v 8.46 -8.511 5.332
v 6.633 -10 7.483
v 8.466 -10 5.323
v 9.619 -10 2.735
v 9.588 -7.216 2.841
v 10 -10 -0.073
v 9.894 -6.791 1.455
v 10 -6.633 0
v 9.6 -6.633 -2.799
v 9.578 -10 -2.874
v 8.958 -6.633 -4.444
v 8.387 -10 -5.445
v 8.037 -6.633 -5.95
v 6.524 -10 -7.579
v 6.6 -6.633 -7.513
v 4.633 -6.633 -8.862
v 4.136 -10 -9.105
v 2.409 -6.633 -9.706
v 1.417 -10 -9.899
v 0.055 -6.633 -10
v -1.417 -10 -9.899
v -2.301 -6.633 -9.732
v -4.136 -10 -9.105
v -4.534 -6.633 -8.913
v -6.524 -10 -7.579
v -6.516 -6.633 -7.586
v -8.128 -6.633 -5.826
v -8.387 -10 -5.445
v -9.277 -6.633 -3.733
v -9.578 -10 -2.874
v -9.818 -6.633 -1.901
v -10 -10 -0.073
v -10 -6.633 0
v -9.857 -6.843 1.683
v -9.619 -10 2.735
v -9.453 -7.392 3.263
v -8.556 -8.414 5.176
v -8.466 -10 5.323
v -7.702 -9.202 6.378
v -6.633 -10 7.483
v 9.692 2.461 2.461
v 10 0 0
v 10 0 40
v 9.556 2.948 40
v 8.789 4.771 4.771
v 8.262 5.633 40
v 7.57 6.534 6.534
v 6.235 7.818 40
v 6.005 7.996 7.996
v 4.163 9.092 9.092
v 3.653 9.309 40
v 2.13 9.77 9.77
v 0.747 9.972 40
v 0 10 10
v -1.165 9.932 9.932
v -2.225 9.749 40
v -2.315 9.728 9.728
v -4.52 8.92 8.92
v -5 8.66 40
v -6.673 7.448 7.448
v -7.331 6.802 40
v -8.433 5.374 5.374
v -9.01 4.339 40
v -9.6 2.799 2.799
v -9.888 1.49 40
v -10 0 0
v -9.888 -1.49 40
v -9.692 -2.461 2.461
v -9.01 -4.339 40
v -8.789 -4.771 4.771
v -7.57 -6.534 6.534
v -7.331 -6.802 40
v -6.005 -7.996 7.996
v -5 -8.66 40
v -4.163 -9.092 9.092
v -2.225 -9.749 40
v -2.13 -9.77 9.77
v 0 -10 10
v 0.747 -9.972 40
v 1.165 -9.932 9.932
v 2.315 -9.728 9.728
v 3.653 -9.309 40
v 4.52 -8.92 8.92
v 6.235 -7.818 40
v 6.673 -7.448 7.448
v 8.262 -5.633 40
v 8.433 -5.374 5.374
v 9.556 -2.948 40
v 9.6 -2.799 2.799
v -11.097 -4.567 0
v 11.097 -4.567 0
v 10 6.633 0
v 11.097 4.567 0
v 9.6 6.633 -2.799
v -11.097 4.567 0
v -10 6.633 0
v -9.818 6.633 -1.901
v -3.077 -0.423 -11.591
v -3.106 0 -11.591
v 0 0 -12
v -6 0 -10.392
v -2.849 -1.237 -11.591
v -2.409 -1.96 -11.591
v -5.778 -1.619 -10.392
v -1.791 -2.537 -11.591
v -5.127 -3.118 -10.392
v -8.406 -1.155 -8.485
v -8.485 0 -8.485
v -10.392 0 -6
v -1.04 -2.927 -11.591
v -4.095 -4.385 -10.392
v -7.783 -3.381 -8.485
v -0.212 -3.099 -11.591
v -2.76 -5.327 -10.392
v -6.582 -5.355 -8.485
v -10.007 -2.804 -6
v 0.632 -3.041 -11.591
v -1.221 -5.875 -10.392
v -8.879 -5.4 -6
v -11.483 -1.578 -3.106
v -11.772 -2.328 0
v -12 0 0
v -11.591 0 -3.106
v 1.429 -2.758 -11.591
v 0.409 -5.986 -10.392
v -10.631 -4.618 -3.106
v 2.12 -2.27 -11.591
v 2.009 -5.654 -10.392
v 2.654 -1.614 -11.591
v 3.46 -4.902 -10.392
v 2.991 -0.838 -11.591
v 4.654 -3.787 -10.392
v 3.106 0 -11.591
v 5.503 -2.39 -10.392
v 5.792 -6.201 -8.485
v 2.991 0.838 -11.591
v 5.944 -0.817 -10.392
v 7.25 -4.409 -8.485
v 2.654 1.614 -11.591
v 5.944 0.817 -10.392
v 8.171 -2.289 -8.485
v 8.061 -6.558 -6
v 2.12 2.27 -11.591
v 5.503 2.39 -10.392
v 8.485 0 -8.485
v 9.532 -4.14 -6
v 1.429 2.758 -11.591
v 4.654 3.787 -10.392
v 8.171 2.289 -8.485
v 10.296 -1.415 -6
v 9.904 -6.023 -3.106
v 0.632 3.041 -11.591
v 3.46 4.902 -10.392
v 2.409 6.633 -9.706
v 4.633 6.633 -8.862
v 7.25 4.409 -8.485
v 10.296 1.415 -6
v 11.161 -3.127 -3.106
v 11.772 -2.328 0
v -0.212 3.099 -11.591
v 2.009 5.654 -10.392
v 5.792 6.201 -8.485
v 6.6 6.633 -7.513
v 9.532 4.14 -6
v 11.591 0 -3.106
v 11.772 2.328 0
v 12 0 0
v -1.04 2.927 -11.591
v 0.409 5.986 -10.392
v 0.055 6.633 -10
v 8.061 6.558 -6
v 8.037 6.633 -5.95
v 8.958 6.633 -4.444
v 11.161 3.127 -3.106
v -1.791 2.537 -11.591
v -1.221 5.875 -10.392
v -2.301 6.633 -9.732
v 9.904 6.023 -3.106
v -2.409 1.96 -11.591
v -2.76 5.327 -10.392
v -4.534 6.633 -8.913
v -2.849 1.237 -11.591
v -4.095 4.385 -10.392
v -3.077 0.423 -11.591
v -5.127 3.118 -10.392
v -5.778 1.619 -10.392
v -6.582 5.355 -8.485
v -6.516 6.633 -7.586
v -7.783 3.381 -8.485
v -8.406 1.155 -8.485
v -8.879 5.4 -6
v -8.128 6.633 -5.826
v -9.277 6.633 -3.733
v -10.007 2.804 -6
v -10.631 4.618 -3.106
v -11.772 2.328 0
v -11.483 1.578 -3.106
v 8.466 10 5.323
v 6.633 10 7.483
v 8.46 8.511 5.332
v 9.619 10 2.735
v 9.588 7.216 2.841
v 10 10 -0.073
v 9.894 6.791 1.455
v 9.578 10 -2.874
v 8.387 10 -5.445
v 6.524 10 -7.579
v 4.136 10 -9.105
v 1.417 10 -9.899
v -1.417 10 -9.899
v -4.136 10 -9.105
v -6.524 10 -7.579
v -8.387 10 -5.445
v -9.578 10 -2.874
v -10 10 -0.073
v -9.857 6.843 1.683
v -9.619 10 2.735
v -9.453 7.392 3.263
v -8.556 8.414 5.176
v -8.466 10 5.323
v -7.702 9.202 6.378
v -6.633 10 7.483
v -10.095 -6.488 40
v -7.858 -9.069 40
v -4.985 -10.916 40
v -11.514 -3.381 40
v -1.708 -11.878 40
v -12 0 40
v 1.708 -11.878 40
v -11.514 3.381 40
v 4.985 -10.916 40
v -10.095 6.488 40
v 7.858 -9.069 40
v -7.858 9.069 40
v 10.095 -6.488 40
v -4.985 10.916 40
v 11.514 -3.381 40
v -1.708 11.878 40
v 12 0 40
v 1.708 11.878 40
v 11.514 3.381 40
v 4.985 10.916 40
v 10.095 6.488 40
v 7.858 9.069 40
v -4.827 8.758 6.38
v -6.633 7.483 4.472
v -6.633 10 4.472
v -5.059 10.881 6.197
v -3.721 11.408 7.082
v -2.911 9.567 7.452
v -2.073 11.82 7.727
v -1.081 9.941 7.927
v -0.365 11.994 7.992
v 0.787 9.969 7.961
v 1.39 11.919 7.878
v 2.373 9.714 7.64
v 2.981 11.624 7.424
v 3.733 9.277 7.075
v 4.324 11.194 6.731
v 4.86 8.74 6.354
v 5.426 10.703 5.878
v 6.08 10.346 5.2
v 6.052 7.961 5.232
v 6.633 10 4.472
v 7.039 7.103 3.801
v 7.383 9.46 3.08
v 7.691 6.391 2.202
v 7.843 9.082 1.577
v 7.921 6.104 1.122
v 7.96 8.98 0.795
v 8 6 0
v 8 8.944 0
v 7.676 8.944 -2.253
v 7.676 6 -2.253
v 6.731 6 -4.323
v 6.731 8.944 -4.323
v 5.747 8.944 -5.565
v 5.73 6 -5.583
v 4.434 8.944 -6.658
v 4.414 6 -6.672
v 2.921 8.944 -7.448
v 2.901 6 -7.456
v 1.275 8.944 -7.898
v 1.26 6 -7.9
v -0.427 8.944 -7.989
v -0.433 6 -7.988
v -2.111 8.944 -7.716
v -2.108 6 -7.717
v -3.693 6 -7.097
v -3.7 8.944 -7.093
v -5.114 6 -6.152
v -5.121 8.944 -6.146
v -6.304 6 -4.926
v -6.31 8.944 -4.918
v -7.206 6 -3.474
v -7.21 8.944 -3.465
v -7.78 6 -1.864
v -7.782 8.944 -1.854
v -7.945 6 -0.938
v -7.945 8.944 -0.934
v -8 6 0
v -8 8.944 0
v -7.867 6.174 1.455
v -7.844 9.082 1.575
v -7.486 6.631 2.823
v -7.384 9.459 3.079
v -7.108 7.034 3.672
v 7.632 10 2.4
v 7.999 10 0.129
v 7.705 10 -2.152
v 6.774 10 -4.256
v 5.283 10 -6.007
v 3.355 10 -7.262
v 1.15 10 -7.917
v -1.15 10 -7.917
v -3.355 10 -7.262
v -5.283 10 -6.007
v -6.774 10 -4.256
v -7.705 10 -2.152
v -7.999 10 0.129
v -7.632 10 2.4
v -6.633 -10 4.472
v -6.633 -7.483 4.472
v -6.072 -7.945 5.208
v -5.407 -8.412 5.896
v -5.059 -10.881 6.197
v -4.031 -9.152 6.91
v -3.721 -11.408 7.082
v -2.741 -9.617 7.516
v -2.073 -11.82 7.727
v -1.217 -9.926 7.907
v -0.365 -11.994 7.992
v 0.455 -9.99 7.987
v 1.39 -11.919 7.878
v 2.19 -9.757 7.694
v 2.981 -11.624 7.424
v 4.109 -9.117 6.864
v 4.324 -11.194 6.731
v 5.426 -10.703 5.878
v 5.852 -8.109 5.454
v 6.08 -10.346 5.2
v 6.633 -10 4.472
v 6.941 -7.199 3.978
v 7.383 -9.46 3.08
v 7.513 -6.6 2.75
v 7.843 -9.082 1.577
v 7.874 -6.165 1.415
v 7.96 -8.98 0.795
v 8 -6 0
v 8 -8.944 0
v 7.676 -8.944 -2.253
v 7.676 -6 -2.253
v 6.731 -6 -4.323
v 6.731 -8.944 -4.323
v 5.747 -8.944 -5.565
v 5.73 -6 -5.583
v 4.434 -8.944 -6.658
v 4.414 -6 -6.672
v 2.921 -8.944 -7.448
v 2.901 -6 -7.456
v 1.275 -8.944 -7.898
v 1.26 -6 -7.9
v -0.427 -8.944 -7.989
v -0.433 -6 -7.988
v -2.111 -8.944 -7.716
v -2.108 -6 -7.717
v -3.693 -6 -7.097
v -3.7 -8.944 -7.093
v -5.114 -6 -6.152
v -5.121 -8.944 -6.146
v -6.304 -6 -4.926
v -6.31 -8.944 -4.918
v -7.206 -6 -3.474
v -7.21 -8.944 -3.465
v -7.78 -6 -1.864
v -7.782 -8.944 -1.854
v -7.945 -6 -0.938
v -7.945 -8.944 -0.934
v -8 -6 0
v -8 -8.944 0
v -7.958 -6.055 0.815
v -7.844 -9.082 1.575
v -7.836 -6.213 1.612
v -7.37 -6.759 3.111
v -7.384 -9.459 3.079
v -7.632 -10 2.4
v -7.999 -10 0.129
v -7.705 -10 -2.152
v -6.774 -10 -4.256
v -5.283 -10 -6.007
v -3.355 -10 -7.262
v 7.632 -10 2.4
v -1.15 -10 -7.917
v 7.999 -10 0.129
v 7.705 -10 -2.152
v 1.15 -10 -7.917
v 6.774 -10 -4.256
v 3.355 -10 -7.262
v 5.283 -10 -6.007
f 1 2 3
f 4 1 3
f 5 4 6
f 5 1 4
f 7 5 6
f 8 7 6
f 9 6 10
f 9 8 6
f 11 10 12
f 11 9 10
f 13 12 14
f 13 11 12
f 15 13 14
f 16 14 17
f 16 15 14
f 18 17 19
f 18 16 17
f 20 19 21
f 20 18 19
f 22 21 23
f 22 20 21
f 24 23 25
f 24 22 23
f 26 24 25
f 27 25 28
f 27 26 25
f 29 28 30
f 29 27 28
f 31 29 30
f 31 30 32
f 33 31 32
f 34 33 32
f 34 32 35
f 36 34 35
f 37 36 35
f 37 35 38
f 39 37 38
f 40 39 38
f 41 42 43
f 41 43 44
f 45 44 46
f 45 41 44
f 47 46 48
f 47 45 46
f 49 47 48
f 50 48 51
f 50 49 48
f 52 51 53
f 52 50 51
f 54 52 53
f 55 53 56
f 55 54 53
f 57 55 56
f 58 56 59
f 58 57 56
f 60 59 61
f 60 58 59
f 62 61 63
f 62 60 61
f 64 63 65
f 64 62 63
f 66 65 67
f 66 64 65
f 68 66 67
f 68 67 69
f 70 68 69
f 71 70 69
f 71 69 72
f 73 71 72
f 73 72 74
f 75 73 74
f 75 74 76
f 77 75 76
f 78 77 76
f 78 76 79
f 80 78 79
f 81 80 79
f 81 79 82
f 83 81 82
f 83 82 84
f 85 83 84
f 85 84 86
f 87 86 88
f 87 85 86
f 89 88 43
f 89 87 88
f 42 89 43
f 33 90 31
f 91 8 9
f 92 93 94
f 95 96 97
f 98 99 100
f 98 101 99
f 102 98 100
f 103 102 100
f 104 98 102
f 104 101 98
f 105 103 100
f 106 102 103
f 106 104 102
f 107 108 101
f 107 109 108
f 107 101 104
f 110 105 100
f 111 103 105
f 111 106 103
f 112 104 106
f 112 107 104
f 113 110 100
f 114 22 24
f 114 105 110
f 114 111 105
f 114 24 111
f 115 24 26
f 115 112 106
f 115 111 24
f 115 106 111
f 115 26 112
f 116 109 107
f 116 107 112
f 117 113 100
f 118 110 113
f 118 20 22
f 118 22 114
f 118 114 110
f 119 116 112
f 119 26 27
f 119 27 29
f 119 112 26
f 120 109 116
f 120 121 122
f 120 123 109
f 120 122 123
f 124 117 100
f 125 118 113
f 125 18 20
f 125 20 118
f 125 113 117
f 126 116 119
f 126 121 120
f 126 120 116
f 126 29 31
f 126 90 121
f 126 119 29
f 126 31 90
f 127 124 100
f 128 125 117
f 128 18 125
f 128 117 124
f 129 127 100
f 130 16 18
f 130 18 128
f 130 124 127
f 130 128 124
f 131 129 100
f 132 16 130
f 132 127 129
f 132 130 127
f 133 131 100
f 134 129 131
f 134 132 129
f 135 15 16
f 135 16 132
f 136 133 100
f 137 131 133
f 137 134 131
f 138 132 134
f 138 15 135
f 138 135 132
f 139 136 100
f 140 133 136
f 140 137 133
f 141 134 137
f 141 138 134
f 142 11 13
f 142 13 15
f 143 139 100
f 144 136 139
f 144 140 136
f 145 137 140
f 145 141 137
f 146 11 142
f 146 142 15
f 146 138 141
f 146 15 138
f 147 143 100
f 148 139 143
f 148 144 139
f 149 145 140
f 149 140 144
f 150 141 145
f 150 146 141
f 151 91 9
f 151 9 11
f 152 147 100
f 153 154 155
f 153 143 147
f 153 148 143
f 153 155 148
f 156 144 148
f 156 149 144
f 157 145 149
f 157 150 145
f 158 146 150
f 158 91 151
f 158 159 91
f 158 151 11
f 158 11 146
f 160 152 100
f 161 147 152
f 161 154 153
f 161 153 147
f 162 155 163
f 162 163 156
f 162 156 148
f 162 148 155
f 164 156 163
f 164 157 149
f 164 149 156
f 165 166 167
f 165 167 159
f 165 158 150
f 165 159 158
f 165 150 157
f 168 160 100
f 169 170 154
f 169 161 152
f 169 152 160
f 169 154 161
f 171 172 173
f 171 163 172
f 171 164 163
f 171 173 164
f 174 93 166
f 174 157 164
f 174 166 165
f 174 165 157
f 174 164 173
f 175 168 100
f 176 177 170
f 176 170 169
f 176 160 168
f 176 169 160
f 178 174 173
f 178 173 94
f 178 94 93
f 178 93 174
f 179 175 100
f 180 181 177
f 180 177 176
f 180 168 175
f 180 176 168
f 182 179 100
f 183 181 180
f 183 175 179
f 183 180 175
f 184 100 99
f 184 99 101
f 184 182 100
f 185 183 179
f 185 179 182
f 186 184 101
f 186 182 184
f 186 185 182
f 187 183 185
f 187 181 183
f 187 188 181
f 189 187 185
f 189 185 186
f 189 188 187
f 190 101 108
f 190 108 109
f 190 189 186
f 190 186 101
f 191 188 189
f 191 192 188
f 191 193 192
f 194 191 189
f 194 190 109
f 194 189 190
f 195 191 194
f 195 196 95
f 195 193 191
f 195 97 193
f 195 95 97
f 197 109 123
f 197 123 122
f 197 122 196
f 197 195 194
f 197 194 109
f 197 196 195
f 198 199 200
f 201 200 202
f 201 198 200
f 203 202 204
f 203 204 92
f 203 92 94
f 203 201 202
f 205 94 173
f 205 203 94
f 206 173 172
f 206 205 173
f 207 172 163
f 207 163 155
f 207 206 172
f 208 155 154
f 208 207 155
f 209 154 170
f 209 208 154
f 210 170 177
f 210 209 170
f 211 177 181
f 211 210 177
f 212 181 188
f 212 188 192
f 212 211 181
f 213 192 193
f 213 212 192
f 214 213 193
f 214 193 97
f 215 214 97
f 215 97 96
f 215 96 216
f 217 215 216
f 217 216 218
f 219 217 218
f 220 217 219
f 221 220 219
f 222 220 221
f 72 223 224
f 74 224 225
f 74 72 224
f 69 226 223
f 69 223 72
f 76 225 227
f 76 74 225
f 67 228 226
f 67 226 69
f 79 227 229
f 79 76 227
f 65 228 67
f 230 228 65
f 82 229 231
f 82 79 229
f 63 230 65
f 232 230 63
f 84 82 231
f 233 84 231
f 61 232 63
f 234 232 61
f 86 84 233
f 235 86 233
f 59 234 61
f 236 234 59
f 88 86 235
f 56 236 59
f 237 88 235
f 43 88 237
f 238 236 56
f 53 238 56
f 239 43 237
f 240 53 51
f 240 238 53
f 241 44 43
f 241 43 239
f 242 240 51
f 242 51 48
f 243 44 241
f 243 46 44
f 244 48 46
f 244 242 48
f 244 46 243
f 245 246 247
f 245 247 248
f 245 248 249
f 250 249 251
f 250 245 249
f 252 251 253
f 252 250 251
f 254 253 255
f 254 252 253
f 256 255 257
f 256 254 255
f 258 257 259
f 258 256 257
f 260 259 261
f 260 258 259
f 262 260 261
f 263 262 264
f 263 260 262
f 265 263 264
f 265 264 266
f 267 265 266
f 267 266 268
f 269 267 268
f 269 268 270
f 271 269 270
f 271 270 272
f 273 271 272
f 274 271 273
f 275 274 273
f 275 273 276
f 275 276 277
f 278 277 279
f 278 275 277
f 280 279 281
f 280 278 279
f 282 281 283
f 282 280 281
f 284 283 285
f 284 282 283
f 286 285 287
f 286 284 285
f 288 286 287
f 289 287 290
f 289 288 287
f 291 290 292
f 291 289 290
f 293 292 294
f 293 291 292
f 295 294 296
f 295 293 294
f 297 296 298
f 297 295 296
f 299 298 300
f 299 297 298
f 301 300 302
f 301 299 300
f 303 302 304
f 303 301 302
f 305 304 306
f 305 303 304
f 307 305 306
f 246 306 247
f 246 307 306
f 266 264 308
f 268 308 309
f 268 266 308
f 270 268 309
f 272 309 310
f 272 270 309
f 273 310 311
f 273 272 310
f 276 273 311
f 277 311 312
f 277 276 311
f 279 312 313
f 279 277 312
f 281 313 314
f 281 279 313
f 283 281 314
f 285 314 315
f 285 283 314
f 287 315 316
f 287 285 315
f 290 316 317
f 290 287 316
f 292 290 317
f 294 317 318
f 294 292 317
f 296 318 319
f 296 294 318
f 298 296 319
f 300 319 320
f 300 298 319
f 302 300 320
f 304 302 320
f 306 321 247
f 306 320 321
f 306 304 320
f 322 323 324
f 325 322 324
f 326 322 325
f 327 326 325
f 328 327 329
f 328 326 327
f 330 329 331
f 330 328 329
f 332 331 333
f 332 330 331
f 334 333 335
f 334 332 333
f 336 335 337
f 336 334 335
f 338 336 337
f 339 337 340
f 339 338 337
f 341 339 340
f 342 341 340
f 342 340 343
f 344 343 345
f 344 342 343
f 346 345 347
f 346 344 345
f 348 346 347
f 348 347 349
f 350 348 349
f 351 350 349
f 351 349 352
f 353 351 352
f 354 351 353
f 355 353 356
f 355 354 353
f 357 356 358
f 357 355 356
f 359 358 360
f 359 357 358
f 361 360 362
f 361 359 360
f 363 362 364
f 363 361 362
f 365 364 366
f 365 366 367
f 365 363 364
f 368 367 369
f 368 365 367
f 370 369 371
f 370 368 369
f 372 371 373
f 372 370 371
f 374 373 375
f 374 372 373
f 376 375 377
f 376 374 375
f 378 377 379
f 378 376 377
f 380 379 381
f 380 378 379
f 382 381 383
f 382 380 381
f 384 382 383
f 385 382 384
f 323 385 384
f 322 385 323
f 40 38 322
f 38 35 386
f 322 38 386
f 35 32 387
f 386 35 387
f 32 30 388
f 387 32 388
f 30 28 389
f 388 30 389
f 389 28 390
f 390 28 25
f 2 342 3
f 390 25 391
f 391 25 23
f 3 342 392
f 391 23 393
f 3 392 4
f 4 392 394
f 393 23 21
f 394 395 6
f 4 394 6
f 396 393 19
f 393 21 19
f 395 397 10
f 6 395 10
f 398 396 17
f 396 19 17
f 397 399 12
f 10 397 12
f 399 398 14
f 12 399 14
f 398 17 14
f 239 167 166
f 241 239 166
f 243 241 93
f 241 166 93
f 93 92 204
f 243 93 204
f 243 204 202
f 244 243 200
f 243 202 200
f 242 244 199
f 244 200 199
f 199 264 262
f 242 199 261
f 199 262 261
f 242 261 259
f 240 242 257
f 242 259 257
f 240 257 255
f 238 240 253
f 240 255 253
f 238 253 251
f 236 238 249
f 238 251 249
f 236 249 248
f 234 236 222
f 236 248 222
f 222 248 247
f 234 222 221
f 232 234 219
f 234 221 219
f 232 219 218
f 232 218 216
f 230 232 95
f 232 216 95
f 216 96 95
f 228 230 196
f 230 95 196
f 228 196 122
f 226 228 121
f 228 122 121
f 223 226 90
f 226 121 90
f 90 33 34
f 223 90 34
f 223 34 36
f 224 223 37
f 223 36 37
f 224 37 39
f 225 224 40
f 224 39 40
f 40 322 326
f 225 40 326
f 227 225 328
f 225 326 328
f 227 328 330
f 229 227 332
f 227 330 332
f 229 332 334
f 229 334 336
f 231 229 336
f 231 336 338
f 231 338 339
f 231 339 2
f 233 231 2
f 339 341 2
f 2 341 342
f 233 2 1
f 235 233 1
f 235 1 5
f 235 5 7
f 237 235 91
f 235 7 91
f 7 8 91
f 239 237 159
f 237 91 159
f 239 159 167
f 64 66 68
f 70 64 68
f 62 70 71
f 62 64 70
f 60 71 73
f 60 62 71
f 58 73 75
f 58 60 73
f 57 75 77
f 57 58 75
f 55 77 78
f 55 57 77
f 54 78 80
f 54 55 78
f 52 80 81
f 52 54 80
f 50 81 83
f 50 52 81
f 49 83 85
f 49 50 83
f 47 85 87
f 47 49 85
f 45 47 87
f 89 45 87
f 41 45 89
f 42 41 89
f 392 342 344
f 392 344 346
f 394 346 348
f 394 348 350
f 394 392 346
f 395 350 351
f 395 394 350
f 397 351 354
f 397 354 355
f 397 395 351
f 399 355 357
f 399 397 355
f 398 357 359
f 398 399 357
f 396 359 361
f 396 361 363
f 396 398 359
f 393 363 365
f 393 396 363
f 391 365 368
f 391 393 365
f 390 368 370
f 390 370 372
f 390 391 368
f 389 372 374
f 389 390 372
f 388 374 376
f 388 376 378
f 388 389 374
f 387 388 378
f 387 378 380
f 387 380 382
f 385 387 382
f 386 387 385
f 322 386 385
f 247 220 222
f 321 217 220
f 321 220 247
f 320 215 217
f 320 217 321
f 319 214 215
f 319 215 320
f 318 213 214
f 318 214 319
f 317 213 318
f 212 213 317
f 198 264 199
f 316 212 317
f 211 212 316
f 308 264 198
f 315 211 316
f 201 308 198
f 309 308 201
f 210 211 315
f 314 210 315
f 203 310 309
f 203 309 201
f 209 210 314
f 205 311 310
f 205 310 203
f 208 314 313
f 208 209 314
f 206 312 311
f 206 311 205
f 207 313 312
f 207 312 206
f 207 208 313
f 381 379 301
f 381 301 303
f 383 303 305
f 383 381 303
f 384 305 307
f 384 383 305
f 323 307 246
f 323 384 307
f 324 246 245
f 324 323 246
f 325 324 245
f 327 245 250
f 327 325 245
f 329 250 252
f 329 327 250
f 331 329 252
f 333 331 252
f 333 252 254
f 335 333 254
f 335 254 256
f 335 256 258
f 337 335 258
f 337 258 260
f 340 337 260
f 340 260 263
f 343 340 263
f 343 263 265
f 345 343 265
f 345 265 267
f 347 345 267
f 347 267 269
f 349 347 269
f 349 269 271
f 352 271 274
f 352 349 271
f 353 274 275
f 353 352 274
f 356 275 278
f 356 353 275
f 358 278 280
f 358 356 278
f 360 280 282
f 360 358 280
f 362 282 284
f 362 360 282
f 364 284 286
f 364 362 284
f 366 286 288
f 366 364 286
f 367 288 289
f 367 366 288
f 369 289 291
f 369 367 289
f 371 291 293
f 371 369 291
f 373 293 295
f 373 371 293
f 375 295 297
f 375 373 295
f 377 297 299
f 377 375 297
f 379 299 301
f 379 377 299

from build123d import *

# Parameters (mm, degrees)
SKETCH_1_R               = 12
SKETCH_1_R_2             = 10
EXTRUDE_1_DEPTH          = 40
SKETCH_3_R               = 10
SKETCH_3_R_2             = 8
EXTRUDE_2_DEPTH          = 10
CUT_EXTRUDE_1_DEPTH      = 44.451122112
CUT_EXTRUDE_1_DEPTH_BACK = 44.451122112
SKETCH_4_R               = 8


with BuildPart() as part:
    # 草图1 → 凸台-拉伸1 (new body)
    with BuildSketch(Plane.XY):
        Circle(SKETCH_1_R)
        Circle(SKETCH_1_R_2, mode=Mode.SUBTRACT)
    extrude(amount=EXTRUDE_1_DEPTH)

    # 草图2 → 旋转1 (revolve)
    with BuildSketch(Plane(origin=(0, 0, 0), x_dir=(1, 0, 0), z_dir=(0, 1, 0))):
        with BuildLine():
            Line((-12, 0), (-10, 0))
            ThreePointArc((-10, 0), (-7.071067812, 7.071067812), (0, 10))
            Line((0, 10), (0, 12))
            ThreePointArc((0, 12), (-8.485281374, 8.485281374), (-12, 0))
        make_face()
    revolve(axis=Axis((0, 0, -10), (0, 0, 1)))

    # 草图3 → 凸台-拉伸2 (add, symmetric)
    with BuildSketch(Plane(origin=(0, 0, 0), x_dir=(1, 0, 0), z_dir=(0, 1, 0))):
        Circle(SKETCH_3_R)
        with Locations(Location((0, 0, 0), (0, 0, 180))):
            Circle(SKETCH_3_R_2, mode=Mode.SUBTRACT)
    extrude(amount=EXTRUDE_2_DEPTH, both=True)

    # 草图4 → 切除-拉伸1 (cut, two sides: drawn at the far end of the back side and taken through both)
    with BuildSketch(Plane(origin=(0, 0, 0), x_dir=(1, 0, 0), z_dir=(0, 1, 0)).offset(-CUT_EXTRUDE_1_DEPTH_BACK)):
        with Locations(Location((0, 0, 0), (0, 0, 213.987843581))):
            Circle(SKETCH_4_R)
    extrude(amount=CUT_EXTRUDE_1_DEPTH + CUT_EXTRUDE_1_DEPTH_BACK, mode=Mode.SUBTRACT)


solid = part.part
